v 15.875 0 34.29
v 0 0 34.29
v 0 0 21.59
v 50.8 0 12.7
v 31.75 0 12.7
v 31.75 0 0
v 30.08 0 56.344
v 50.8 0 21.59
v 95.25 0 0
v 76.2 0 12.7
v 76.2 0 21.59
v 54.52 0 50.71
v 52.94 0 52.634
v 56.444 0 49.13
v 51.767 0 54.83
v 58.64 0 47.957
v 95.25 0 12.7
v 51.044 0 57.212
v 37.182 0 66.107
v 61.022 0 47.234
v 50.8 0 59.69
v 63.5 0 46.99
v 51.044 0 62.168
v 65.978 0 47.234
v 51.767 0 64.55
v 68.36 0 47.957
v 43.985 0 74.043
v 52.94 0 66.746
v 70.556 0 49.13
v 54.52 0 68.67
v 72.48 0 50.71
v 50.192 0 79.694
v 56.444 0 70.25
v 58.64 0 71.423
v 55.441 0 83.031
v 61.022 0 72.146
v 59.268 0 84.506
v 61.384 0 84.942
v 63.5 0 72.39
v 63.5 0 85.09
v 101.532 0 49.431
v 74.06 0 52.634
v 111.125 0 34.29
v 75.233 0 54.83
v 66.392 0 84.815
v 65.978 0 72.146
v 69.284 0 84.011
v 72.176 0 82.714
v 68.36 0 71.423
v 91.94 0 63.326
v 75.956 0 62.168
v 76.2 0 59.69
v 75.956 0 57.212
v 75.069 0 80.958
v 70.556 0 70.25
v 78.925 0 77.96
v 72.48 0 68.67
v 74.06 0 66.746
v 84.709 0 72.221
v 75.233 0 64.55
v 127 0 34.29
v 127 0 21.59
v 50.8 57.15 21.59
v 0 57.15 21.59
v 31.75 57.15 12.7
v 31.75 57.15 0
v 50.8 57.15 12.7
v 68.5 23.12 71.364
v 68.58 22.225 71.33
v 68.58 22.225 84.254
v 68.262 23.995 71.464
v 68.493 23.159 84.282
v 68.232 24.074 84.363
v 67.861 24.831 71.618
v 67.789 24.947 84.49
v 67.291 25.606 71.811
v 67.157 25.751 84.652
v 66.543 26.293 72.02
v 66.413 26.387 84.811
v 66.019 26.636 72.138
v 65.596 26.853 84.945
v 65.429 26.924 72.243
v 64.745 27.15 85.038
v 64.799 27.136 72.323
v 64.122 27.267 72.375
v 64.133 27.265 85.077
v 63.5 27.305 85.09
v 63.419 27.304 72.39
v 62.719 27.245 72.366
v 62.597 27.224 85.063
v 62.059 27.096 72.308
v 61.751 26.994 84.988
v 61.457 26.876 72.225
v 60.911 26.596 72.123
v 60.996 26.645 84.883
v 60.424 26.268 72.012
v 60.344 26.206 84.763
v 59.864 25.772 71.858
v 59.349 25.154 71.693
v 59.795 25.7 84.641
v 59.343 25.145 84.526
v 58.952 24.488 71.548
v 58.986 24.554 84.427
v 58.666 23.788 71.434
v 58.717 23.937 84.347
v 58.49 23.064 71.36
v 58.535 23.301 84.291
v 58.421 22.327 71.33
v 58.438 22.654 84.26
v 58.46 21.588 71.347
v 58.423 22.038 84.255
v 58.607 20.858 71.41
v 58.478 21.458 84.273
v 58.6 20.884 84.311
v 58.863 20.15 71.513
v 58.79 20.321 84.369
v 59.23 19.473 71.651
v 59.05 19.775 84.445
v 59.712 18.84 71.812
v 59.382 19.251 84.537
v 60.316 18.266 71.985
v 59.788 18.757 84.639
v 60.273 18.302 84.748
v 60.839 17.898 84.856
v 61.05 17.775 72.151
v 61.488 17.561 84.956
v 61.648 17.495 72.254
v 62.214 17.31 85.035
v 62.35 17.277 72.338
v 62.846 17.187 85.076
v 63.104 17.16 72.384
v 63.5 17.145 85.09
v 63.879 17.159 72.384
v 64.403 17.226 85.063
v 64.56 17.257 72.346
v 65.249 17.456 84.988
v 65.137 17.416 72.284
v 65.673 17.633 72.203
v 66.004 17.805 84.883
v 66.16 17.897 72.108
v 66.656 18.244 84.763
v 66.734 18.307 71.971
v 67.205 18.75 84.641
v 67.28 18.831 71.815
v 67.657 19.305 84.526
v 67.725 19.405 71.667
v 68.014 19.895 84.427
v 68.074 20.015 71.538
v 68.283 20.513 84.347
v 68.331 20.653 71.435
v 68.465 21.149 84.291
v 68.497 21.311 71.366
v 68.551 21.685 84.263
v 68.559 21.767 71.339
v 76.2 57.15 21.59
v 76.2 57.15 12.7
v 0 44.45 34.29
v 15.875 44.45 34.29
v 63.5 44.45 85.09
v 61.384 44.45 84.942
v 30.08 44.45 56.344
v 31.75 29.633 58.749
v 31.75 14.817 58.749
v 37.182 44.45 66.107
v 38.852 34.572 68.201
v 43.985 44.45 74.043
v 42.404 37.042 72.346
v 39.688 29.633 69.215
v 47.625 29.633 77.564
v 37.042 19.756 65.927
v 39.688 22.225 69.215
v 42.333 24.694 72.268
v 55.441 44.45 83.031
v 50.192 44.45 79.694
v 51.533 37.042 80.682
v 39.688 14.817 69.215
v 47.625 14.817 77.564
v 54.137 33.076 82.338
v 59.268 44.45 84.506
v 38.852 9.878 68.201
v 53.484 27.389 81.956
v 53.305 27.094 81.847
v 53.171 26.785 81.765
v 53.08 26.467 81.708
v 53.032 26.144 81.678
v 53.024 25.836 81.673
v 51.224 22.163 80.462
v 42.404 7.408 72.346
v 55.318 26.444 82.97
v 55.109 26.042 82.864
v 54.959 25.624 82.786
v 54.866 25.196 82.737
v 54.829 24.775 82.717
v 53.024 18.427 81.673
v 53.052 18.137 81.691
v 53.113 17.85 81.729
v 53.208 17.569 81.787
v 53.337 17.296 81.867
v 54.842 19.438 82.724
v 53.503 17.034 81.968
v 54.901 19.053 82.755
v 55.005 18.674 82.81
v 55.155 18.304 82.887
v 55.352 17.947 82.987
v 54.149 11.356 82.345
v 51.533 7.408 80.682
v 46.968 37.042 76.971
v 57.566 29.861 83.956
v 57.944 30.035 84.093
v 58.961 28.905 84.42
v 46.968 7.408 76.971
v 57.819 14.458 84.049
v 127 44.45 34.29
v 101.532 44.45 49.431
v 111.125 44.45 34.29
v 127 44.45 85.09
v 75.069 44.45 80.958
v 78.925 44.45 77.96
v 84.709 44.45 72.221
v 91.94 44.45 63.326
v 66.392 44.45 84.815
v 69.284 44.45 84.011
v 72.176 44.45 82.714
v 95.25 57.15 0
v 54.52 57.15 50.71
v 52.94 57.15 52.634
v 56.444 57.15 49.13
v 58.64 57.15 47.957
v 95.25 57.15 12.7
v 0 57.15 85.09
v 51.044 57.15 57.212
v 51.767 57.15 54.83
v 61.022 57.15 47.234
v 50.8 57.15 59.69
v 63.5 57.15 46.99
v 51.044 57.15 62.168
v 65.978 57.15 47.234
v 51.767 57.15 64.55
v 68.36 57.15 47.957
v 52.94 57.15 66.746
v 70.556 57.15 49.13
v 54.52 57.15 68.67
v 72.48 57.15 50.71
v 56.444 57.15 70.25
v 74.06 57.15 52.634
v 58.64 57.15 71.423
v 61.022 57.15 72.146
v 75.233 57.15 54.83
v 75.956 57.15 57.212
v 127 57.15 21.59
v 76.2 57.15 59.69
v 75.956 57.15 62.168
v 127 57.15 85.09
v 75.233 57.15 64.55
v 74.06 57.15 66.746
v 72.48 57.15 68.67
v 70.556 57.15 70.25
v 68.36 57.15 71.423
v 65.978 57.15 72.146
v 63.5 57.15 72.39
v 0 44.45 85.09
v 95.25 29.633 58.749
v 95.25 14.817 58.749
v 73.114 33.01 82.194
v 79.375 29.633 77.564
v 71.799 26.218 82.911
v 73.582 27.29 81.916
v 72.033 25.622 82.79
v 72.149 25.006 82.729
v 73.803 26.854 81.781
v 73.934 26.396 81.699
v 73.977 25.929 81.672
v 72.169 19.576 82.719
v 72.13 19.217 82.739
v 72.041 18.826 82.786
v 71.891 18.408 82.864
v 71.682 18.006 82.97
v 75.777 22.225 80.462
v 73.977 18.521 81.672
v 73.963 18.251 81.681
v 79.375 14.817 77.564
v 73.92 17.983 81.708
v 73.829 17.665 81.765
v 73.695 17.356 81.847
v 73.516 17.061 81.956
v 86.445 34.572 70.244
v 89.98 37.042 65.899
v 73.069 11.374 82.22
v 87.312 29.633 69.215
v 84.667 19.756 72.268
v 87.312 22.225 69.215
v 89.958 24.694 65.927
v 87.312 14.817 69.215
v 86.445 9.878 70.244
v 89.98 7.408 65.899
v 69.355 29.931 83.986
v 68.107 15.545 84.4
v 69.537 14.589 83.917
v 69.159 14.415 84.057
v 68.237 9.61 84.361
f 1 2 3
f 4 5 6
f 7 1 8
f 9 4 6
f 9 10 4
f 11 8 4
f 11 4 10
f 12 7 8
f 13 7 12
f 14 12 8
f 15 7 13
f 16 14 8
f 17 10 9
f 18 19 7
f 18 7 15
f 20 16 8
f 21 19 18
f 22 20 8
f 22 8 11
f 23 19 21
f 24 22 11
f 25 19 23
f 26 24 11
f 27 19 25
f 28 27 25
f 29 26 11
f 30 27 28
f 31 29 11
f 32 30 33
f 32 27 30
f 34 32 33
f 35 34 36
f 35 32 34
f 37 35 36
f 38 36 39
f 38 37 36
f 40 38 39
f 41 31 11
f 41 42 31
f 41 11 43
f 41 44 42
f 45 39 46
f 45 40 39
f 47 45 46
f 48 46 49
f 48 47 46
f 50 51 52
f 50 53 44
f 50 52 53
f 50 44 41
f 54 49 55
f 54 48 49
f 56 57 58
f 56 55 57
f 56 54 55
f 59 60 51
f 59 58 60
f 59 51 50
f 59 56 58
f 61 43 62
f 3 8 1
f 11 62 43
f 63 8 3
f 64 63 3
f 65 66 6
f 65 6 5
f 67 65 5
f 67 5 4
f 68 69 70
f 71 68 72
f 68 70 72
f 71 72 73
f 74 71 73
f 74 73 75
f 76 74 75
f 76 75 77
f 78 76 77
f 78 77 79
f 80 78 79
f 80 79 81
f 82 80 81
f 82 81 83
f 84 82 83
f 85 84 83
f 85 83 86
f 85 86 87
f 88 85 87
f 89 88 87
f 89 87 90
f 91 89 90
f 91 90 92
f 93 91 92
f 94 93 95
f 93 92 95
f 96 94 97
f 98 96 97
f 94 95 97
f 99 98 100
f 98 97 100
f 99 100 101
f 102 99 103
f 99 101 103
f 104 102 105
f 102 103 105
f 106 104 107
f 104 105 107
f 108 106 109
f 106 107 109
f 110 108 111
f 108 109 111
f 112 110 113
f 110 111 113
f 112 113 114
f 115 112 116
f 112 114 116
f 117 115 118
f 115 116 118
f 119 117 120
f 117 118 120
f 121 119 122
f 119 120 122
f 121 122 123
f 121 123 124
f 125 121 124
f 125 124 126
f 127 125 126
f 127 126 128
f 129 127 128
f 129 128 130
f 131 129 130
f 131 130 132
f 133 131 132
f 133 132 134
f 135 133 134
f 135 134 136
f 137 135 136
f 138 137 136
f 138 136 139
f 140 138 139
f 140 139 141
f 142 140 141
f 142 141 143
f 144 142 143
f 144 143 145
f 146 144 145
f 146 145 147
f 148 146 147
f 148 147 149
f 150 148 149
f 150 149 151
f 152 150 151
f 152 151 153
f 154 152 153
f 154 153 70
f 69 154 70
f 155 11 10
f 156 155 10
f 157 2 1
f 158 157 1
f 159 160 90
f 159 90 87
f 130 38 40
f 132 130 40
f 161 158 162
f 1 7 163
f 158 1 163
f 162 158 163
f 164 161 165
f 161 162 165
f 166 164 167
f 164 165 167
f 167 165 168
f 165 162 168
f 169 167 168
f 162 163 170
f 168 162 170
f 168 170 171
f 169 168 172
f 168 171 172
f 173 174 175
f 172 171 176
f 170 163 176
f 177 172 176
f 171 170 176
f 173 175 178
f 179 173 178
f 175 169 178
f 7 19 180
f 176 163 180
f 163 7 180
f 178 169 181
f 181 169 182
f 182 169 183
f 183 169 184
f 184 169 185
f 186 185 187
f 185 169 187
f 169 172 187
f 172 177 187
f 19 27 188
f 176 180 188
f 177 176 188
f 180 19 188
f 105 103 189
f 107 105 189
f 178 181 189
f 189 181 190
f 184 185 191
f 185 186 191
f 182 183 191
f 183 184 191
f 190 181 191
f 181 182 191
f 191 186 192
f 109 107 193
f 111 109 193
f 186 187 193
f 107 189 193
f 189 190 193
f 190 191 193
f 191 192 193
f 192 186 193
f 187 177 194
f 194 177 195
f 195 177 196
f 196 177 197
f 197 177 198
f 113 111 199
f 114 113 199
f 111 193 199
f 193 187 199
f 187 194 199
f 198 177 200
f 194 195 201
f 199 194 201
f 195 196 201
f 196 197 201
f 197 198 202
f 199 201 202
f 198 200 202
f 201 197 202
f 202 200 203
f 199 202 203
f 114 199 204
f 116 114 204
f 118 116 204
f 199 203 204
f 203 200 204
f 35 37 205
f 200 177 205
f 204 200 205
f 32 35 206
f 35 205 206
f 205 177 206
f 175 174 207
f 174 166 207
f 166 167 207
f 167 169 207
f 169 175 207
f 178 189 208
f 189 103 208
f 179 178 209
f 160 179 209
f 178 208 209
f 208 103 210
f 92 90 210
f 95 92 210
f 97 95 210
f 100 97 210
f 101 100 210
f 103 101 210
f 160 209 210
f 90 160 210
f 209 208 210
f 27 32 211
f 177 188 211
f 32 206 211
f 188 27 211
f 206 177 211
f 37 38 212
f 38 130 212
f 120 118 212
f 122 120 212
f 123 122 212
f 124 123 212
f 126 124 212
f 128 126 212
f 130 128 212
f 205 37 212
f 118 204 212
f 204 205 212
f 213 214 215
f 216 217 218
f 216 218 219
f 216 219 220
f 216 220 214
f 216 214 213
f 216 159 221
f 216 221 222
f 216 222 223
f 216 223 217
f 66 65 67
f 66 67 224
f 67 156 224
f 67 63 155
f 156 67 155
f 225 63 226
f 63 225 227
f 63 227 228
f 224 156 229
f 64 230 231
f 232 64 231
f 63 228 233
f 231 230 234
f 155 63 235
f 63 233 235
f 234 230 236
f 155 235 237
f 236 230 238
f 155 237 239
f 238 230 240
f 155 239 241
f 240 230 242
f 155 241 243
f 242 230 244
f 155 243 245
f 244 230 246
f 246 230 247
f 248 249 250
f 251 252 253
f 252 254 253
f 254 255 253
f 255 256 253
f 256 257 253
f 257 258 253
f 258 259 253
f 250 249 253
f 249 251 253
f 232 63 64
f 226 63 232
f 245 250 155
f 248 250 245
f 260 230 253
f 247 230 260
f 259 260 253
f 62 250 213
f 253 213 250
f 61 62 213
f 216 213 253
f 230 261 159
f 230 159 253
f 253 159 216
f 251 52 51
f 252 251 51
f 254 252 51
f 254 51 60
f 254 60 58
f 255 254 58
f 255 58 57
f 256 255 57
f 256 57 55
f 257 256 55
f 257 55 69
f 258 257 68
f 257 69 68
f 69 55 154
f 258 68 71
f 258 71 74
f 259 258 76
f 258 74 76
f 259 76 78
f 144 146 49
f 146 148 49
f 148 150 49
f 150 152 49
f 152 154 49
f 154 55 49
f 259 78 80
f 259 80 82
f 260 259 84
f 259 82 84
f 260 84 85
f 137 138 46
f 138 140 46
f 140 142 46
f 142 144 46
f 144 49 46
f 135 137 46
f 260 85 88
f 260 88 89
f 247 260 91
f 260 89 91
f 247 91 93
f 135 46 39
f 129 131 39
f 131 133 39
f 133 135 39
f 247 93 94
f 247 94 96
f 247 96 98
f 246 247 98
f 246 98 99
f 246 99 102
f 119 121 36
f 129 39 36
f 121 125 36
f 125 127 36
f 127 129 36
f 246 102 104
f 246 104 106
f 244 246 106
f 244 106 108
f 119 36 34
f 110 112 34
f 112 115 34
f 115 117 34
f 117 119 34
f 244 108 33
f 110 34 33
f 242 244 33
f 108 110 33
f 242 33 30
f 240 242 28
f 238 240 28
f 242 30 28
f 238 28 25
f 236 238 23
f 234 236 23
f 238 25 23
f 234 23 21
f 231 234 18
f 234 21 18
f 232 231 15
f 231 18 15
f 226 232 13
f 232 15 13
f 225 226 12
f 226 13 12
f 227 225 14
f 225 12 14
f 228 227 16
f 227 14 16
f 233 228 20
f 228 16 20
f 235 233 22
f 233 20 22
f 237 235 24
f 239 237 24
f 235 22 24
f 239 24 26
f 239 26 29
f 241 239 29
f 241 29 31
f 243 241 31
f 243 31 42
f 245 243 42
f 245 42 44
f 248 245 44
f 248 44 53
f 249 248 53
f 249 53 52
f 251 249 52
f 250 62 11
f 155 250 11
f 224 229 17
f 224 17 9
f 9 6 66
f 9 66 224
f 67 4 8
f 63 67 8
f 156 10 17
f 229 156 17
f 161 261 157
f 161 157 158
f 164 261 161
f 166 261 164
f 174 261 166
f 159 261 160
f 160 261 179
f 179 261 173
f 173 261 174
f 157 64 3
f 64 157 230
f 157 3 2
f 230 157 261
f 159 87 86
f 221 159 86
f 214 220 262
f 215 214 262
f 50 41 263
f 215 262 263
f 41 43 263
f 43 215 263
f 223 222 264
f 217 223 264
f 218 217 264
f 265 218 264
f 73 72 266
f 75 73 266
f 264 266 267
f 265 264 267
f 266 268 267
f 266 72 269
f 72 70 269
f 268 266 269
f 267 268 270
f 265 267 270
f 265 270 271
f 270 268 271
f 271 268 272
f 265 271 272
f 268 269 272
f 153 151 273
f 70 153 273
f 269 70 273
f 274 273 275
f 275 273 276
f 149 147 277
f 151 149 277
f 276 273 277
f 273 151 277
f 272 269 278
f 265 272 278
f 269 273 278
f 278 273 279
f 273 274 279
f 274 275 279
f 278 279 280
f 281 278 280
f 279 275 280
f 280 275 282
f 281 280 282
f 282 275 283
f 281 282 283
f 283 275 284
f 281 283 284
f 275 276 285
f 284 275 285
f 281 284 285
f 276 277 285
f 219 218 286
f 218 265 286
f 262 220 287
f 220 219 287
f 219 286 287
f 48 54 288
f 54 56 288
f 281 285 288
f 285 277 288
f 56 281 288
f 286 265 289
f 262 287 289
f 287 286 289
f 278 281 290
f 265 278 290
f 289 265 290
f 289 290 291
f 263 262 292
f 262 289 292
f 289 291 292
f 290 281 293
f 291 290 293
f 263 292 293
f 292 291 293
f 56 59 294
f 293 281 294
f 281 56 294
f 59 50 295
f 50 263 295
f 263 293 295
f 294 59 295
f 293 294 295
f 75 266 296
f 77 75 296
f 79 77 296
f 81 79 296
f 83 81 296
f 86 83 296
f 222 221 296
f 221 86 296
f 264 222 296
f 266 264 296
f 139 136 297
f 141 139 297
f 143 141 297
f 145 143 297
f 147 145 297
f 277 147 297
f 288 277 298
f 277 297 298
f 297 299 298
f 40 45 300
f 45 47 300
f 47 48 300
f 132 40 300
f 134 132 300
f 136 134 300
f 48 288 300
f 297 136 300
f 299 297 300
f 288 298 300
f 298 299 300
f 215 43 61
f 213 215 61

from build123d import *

# Parameters (mm, degrees)
F0_W     = 127
F0_H     = 85.09
F1_DEPTH = 57.15
F2_R     = 12.7
F3_DEPTH = 57.15
F4_R     = 5.08
F5_DEPTH = 25.4
F6_DEPTH = 44.45


with BuildPart() as f1:
    # F0 (on Front) → F1 (new body)
    with BuildSketch(Plane.XZ):
        with Locations((63.5, 42.545)):
            Rectangle(F0_W, F0_H)
    extrude(amount=-F1_DEPTH)

    # F2 (on face) → F3 (cut)
    with BuildSketch(Plane.XZ):
        Polygon((95.25, 12.7), (95.25, 0), (127, 0), (127, 21.59), (76.2, 21.59), (76.2, 12.7), align=None)
        Polygon((0, 0), (31.75, 0), (31.75, 12.7), (50.8, 12.7), (50.8, 21.59), (0, 21.59), align=None)
        with Locations((63.5, 59.69)):
            Circle(F2_R)
    extrude(amount=-F3_DEPTH, mode=Mode.SUBTRACT)

    # F4 (on face) → F5 (cut)
    with BuildSketch(Plane.XY.offset(85.09)):
        with Locations((63.5, 22.225)):
            Circle(F4_R)
    extrude(amount=-F5_DEPTH, mode=Mode.SUBTRACT)

    # F2 (on face) → F6 (cut)
    with BuildSketch(Plane.XZ):
        with BuildLine():
            Line((0, 85.09), (0, 34.29))
            Line((0, 34.29), (15.875, 34.29))
            add(Edge.make_bspline(
                [(15.875, 34.29), (31.75, 59.69), (47.625, 85.09), (63.5, 85.09)],
                knots=[0, 0, 0, 0, 0.5, 0.5, 0.5, 0.5], degree=3))
            Line((63.5, 85.09), (0, 85.09))
        make_face()
        with BuildLine():
            Line((111.125, 34.29), (127, 34.29))
            Line((127, 34.29), (127, 85.09))
            Line((127, 85.09), (63.5, 85.09))
            add(Edge.make_bspline(
                [(63.5, 85.09), (79.375, 85.09), (95.25, 59.69), (111.125, 34.29)],
                knots=[0.5, 0.5, 0.5, 0.5, 1, 1, 1, 1], degree=3))
        make_face()
    extrude(amount=-F6_DEPTH, mode=Mode.SUBTRACT)


solid = f1.part
